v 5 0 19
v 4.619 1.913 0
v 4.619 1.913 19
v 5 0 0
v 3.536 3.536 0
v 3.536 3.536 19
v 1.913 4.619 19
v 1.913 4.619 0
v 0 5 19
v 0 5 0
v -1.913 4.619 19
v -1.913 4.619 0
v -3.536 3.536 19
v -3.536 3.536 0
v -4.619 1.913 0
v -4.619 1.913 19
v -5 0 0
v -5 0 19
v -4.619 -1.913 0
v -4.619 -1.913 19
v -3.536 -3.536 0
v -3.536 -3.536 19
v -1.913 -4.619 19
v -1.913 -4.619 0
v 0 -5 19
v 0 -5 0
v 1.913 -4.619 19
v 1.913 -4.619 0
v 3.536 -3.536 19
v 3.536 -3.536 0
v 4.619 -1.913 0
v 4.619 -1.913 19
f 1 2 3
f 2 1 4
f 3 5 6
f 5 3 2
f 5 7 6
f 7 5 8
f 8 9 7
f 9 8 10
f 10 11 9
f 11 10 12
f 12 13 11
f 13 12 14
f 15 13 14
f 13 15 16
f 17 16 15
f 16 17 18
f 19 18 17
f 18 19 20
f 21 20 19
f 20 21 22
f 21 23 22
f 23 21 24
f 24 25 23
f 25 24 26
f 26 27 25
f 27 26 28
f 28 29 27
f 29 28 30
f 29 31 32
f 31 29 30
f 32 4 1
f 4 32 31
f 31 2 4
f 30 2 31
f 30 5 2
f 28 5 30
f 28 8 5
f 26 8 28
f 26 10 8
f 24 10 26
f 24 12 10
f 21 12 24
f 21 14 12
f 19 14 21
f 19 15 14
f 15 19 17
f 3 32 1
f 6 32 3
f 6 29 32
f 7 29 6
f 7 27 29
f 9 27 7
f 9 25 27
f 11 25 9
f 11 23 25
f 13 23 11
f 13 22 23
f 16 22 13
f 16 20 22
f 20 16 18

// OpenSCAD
// Generated by SolidPython 1.0.1 on 2020-07-29 00:46:45


cylinder(h = 19, r1 = 5, r2 = 5);
/***********************************************
*********      SolidPython code:      **********
************************************************
 
# import packages: SolidPython
from solid import *
from solid.utils import *
from itertools import chain, combinations, permutations


class Resize:

    def __init__(self, scad_file):
        self.scad_file = scad_file
        #self.scad_file = import_scad(scad_file)
        # cone/cylinder param:
        self.r1 = 0
        self.r2 = 0
        self.h = 0
        # rectangular prism param:
        self.w = 0
        self.l = 0
        # ellipse param:
        self.r = 0

    # import OpenScad code (file name corresponds to shape)


    # classify shape + parameters
    def assign(self, param1, param2, param3):
        if self.scad_file == 'cone.scad':
            self.r1 = param1
            self.r2 = param2
            self.h = param3
        elif self.scad_file == 'cylinder.scad':
            self.r1 = param1
            self.r2 = param2
            self.h = param3
        elif self.scad_file == 'rectangularPrism.scad':
            self.h = param1
            self.l = param2
            self.w = param3
        else:
            self.r = param1
            self.h = param2

    # resize parameters
    def iterate(self):
        x = range(3, 20, 2)
        i = 1
        if self.scad_file == 'cone.scad':
            tempList = list(permutations(x, 2))
            for temp in tempList:
                param1 = temp[0]
                param2 = temp[1]
                filepath = 'produced_scad_files/' + 'cone' + str(param1) + '_' + str(param2) + '_' + '.scad'
                scad_render_to_file(cylinder(h=param1, r1=param2, r2=0), filepath)

        elif self.scad_file == 'cylinder.scad':
            tempList = list(permutations(x, 3))
            for temp in tempList:
                param1 = temp[0]
                param2 = temp[1]
                filepath = 'produced_scad_files/' + 'cylinder' + str(param1) + '_' + str(param2) + '_' + '.scad'
                scad_render_to_file(cylinder(h=param1, r1=param2, r2=param2), filepath)

        elif self.scad_file == 'rectangularPrism.scad':
            tempList = list(permutations(x, 3))
            for temp in tempList:
                param1 = temp[0]
                param2 = temp[1]
                param3 = temp[2]
                filepath = 'produced_scad_files/' + 'rectangularPrism' + str(param1) + '_' + str(param2) + '_' + str(
                    param3) + '.scad'
                scad_render_to_file(cube(size=(param1, param2, param3)), filepath)

        elif self.scad_file == 'ellipse.scad':
            tempList = list(permutations(x, 4))
            for temp in tempList:
                param1 = temp[0]
                param2 = temp[1]
                param3 = temp[2]
                param4 = temp[3]
                filepath = 'produced_scad_files/' + 'ellipse' + str(param1) + '_' + str(param2) + '_' + str(param3) + '_' + str(param4) + '.scad'
                scad_render_to_file(scale([param1, param2, param3])(sphere(r=param4)), filepath)

    def render_to_scadfile(self):
        scad_render_to_file(scad, 'example.scad') 
 
************************************************/
